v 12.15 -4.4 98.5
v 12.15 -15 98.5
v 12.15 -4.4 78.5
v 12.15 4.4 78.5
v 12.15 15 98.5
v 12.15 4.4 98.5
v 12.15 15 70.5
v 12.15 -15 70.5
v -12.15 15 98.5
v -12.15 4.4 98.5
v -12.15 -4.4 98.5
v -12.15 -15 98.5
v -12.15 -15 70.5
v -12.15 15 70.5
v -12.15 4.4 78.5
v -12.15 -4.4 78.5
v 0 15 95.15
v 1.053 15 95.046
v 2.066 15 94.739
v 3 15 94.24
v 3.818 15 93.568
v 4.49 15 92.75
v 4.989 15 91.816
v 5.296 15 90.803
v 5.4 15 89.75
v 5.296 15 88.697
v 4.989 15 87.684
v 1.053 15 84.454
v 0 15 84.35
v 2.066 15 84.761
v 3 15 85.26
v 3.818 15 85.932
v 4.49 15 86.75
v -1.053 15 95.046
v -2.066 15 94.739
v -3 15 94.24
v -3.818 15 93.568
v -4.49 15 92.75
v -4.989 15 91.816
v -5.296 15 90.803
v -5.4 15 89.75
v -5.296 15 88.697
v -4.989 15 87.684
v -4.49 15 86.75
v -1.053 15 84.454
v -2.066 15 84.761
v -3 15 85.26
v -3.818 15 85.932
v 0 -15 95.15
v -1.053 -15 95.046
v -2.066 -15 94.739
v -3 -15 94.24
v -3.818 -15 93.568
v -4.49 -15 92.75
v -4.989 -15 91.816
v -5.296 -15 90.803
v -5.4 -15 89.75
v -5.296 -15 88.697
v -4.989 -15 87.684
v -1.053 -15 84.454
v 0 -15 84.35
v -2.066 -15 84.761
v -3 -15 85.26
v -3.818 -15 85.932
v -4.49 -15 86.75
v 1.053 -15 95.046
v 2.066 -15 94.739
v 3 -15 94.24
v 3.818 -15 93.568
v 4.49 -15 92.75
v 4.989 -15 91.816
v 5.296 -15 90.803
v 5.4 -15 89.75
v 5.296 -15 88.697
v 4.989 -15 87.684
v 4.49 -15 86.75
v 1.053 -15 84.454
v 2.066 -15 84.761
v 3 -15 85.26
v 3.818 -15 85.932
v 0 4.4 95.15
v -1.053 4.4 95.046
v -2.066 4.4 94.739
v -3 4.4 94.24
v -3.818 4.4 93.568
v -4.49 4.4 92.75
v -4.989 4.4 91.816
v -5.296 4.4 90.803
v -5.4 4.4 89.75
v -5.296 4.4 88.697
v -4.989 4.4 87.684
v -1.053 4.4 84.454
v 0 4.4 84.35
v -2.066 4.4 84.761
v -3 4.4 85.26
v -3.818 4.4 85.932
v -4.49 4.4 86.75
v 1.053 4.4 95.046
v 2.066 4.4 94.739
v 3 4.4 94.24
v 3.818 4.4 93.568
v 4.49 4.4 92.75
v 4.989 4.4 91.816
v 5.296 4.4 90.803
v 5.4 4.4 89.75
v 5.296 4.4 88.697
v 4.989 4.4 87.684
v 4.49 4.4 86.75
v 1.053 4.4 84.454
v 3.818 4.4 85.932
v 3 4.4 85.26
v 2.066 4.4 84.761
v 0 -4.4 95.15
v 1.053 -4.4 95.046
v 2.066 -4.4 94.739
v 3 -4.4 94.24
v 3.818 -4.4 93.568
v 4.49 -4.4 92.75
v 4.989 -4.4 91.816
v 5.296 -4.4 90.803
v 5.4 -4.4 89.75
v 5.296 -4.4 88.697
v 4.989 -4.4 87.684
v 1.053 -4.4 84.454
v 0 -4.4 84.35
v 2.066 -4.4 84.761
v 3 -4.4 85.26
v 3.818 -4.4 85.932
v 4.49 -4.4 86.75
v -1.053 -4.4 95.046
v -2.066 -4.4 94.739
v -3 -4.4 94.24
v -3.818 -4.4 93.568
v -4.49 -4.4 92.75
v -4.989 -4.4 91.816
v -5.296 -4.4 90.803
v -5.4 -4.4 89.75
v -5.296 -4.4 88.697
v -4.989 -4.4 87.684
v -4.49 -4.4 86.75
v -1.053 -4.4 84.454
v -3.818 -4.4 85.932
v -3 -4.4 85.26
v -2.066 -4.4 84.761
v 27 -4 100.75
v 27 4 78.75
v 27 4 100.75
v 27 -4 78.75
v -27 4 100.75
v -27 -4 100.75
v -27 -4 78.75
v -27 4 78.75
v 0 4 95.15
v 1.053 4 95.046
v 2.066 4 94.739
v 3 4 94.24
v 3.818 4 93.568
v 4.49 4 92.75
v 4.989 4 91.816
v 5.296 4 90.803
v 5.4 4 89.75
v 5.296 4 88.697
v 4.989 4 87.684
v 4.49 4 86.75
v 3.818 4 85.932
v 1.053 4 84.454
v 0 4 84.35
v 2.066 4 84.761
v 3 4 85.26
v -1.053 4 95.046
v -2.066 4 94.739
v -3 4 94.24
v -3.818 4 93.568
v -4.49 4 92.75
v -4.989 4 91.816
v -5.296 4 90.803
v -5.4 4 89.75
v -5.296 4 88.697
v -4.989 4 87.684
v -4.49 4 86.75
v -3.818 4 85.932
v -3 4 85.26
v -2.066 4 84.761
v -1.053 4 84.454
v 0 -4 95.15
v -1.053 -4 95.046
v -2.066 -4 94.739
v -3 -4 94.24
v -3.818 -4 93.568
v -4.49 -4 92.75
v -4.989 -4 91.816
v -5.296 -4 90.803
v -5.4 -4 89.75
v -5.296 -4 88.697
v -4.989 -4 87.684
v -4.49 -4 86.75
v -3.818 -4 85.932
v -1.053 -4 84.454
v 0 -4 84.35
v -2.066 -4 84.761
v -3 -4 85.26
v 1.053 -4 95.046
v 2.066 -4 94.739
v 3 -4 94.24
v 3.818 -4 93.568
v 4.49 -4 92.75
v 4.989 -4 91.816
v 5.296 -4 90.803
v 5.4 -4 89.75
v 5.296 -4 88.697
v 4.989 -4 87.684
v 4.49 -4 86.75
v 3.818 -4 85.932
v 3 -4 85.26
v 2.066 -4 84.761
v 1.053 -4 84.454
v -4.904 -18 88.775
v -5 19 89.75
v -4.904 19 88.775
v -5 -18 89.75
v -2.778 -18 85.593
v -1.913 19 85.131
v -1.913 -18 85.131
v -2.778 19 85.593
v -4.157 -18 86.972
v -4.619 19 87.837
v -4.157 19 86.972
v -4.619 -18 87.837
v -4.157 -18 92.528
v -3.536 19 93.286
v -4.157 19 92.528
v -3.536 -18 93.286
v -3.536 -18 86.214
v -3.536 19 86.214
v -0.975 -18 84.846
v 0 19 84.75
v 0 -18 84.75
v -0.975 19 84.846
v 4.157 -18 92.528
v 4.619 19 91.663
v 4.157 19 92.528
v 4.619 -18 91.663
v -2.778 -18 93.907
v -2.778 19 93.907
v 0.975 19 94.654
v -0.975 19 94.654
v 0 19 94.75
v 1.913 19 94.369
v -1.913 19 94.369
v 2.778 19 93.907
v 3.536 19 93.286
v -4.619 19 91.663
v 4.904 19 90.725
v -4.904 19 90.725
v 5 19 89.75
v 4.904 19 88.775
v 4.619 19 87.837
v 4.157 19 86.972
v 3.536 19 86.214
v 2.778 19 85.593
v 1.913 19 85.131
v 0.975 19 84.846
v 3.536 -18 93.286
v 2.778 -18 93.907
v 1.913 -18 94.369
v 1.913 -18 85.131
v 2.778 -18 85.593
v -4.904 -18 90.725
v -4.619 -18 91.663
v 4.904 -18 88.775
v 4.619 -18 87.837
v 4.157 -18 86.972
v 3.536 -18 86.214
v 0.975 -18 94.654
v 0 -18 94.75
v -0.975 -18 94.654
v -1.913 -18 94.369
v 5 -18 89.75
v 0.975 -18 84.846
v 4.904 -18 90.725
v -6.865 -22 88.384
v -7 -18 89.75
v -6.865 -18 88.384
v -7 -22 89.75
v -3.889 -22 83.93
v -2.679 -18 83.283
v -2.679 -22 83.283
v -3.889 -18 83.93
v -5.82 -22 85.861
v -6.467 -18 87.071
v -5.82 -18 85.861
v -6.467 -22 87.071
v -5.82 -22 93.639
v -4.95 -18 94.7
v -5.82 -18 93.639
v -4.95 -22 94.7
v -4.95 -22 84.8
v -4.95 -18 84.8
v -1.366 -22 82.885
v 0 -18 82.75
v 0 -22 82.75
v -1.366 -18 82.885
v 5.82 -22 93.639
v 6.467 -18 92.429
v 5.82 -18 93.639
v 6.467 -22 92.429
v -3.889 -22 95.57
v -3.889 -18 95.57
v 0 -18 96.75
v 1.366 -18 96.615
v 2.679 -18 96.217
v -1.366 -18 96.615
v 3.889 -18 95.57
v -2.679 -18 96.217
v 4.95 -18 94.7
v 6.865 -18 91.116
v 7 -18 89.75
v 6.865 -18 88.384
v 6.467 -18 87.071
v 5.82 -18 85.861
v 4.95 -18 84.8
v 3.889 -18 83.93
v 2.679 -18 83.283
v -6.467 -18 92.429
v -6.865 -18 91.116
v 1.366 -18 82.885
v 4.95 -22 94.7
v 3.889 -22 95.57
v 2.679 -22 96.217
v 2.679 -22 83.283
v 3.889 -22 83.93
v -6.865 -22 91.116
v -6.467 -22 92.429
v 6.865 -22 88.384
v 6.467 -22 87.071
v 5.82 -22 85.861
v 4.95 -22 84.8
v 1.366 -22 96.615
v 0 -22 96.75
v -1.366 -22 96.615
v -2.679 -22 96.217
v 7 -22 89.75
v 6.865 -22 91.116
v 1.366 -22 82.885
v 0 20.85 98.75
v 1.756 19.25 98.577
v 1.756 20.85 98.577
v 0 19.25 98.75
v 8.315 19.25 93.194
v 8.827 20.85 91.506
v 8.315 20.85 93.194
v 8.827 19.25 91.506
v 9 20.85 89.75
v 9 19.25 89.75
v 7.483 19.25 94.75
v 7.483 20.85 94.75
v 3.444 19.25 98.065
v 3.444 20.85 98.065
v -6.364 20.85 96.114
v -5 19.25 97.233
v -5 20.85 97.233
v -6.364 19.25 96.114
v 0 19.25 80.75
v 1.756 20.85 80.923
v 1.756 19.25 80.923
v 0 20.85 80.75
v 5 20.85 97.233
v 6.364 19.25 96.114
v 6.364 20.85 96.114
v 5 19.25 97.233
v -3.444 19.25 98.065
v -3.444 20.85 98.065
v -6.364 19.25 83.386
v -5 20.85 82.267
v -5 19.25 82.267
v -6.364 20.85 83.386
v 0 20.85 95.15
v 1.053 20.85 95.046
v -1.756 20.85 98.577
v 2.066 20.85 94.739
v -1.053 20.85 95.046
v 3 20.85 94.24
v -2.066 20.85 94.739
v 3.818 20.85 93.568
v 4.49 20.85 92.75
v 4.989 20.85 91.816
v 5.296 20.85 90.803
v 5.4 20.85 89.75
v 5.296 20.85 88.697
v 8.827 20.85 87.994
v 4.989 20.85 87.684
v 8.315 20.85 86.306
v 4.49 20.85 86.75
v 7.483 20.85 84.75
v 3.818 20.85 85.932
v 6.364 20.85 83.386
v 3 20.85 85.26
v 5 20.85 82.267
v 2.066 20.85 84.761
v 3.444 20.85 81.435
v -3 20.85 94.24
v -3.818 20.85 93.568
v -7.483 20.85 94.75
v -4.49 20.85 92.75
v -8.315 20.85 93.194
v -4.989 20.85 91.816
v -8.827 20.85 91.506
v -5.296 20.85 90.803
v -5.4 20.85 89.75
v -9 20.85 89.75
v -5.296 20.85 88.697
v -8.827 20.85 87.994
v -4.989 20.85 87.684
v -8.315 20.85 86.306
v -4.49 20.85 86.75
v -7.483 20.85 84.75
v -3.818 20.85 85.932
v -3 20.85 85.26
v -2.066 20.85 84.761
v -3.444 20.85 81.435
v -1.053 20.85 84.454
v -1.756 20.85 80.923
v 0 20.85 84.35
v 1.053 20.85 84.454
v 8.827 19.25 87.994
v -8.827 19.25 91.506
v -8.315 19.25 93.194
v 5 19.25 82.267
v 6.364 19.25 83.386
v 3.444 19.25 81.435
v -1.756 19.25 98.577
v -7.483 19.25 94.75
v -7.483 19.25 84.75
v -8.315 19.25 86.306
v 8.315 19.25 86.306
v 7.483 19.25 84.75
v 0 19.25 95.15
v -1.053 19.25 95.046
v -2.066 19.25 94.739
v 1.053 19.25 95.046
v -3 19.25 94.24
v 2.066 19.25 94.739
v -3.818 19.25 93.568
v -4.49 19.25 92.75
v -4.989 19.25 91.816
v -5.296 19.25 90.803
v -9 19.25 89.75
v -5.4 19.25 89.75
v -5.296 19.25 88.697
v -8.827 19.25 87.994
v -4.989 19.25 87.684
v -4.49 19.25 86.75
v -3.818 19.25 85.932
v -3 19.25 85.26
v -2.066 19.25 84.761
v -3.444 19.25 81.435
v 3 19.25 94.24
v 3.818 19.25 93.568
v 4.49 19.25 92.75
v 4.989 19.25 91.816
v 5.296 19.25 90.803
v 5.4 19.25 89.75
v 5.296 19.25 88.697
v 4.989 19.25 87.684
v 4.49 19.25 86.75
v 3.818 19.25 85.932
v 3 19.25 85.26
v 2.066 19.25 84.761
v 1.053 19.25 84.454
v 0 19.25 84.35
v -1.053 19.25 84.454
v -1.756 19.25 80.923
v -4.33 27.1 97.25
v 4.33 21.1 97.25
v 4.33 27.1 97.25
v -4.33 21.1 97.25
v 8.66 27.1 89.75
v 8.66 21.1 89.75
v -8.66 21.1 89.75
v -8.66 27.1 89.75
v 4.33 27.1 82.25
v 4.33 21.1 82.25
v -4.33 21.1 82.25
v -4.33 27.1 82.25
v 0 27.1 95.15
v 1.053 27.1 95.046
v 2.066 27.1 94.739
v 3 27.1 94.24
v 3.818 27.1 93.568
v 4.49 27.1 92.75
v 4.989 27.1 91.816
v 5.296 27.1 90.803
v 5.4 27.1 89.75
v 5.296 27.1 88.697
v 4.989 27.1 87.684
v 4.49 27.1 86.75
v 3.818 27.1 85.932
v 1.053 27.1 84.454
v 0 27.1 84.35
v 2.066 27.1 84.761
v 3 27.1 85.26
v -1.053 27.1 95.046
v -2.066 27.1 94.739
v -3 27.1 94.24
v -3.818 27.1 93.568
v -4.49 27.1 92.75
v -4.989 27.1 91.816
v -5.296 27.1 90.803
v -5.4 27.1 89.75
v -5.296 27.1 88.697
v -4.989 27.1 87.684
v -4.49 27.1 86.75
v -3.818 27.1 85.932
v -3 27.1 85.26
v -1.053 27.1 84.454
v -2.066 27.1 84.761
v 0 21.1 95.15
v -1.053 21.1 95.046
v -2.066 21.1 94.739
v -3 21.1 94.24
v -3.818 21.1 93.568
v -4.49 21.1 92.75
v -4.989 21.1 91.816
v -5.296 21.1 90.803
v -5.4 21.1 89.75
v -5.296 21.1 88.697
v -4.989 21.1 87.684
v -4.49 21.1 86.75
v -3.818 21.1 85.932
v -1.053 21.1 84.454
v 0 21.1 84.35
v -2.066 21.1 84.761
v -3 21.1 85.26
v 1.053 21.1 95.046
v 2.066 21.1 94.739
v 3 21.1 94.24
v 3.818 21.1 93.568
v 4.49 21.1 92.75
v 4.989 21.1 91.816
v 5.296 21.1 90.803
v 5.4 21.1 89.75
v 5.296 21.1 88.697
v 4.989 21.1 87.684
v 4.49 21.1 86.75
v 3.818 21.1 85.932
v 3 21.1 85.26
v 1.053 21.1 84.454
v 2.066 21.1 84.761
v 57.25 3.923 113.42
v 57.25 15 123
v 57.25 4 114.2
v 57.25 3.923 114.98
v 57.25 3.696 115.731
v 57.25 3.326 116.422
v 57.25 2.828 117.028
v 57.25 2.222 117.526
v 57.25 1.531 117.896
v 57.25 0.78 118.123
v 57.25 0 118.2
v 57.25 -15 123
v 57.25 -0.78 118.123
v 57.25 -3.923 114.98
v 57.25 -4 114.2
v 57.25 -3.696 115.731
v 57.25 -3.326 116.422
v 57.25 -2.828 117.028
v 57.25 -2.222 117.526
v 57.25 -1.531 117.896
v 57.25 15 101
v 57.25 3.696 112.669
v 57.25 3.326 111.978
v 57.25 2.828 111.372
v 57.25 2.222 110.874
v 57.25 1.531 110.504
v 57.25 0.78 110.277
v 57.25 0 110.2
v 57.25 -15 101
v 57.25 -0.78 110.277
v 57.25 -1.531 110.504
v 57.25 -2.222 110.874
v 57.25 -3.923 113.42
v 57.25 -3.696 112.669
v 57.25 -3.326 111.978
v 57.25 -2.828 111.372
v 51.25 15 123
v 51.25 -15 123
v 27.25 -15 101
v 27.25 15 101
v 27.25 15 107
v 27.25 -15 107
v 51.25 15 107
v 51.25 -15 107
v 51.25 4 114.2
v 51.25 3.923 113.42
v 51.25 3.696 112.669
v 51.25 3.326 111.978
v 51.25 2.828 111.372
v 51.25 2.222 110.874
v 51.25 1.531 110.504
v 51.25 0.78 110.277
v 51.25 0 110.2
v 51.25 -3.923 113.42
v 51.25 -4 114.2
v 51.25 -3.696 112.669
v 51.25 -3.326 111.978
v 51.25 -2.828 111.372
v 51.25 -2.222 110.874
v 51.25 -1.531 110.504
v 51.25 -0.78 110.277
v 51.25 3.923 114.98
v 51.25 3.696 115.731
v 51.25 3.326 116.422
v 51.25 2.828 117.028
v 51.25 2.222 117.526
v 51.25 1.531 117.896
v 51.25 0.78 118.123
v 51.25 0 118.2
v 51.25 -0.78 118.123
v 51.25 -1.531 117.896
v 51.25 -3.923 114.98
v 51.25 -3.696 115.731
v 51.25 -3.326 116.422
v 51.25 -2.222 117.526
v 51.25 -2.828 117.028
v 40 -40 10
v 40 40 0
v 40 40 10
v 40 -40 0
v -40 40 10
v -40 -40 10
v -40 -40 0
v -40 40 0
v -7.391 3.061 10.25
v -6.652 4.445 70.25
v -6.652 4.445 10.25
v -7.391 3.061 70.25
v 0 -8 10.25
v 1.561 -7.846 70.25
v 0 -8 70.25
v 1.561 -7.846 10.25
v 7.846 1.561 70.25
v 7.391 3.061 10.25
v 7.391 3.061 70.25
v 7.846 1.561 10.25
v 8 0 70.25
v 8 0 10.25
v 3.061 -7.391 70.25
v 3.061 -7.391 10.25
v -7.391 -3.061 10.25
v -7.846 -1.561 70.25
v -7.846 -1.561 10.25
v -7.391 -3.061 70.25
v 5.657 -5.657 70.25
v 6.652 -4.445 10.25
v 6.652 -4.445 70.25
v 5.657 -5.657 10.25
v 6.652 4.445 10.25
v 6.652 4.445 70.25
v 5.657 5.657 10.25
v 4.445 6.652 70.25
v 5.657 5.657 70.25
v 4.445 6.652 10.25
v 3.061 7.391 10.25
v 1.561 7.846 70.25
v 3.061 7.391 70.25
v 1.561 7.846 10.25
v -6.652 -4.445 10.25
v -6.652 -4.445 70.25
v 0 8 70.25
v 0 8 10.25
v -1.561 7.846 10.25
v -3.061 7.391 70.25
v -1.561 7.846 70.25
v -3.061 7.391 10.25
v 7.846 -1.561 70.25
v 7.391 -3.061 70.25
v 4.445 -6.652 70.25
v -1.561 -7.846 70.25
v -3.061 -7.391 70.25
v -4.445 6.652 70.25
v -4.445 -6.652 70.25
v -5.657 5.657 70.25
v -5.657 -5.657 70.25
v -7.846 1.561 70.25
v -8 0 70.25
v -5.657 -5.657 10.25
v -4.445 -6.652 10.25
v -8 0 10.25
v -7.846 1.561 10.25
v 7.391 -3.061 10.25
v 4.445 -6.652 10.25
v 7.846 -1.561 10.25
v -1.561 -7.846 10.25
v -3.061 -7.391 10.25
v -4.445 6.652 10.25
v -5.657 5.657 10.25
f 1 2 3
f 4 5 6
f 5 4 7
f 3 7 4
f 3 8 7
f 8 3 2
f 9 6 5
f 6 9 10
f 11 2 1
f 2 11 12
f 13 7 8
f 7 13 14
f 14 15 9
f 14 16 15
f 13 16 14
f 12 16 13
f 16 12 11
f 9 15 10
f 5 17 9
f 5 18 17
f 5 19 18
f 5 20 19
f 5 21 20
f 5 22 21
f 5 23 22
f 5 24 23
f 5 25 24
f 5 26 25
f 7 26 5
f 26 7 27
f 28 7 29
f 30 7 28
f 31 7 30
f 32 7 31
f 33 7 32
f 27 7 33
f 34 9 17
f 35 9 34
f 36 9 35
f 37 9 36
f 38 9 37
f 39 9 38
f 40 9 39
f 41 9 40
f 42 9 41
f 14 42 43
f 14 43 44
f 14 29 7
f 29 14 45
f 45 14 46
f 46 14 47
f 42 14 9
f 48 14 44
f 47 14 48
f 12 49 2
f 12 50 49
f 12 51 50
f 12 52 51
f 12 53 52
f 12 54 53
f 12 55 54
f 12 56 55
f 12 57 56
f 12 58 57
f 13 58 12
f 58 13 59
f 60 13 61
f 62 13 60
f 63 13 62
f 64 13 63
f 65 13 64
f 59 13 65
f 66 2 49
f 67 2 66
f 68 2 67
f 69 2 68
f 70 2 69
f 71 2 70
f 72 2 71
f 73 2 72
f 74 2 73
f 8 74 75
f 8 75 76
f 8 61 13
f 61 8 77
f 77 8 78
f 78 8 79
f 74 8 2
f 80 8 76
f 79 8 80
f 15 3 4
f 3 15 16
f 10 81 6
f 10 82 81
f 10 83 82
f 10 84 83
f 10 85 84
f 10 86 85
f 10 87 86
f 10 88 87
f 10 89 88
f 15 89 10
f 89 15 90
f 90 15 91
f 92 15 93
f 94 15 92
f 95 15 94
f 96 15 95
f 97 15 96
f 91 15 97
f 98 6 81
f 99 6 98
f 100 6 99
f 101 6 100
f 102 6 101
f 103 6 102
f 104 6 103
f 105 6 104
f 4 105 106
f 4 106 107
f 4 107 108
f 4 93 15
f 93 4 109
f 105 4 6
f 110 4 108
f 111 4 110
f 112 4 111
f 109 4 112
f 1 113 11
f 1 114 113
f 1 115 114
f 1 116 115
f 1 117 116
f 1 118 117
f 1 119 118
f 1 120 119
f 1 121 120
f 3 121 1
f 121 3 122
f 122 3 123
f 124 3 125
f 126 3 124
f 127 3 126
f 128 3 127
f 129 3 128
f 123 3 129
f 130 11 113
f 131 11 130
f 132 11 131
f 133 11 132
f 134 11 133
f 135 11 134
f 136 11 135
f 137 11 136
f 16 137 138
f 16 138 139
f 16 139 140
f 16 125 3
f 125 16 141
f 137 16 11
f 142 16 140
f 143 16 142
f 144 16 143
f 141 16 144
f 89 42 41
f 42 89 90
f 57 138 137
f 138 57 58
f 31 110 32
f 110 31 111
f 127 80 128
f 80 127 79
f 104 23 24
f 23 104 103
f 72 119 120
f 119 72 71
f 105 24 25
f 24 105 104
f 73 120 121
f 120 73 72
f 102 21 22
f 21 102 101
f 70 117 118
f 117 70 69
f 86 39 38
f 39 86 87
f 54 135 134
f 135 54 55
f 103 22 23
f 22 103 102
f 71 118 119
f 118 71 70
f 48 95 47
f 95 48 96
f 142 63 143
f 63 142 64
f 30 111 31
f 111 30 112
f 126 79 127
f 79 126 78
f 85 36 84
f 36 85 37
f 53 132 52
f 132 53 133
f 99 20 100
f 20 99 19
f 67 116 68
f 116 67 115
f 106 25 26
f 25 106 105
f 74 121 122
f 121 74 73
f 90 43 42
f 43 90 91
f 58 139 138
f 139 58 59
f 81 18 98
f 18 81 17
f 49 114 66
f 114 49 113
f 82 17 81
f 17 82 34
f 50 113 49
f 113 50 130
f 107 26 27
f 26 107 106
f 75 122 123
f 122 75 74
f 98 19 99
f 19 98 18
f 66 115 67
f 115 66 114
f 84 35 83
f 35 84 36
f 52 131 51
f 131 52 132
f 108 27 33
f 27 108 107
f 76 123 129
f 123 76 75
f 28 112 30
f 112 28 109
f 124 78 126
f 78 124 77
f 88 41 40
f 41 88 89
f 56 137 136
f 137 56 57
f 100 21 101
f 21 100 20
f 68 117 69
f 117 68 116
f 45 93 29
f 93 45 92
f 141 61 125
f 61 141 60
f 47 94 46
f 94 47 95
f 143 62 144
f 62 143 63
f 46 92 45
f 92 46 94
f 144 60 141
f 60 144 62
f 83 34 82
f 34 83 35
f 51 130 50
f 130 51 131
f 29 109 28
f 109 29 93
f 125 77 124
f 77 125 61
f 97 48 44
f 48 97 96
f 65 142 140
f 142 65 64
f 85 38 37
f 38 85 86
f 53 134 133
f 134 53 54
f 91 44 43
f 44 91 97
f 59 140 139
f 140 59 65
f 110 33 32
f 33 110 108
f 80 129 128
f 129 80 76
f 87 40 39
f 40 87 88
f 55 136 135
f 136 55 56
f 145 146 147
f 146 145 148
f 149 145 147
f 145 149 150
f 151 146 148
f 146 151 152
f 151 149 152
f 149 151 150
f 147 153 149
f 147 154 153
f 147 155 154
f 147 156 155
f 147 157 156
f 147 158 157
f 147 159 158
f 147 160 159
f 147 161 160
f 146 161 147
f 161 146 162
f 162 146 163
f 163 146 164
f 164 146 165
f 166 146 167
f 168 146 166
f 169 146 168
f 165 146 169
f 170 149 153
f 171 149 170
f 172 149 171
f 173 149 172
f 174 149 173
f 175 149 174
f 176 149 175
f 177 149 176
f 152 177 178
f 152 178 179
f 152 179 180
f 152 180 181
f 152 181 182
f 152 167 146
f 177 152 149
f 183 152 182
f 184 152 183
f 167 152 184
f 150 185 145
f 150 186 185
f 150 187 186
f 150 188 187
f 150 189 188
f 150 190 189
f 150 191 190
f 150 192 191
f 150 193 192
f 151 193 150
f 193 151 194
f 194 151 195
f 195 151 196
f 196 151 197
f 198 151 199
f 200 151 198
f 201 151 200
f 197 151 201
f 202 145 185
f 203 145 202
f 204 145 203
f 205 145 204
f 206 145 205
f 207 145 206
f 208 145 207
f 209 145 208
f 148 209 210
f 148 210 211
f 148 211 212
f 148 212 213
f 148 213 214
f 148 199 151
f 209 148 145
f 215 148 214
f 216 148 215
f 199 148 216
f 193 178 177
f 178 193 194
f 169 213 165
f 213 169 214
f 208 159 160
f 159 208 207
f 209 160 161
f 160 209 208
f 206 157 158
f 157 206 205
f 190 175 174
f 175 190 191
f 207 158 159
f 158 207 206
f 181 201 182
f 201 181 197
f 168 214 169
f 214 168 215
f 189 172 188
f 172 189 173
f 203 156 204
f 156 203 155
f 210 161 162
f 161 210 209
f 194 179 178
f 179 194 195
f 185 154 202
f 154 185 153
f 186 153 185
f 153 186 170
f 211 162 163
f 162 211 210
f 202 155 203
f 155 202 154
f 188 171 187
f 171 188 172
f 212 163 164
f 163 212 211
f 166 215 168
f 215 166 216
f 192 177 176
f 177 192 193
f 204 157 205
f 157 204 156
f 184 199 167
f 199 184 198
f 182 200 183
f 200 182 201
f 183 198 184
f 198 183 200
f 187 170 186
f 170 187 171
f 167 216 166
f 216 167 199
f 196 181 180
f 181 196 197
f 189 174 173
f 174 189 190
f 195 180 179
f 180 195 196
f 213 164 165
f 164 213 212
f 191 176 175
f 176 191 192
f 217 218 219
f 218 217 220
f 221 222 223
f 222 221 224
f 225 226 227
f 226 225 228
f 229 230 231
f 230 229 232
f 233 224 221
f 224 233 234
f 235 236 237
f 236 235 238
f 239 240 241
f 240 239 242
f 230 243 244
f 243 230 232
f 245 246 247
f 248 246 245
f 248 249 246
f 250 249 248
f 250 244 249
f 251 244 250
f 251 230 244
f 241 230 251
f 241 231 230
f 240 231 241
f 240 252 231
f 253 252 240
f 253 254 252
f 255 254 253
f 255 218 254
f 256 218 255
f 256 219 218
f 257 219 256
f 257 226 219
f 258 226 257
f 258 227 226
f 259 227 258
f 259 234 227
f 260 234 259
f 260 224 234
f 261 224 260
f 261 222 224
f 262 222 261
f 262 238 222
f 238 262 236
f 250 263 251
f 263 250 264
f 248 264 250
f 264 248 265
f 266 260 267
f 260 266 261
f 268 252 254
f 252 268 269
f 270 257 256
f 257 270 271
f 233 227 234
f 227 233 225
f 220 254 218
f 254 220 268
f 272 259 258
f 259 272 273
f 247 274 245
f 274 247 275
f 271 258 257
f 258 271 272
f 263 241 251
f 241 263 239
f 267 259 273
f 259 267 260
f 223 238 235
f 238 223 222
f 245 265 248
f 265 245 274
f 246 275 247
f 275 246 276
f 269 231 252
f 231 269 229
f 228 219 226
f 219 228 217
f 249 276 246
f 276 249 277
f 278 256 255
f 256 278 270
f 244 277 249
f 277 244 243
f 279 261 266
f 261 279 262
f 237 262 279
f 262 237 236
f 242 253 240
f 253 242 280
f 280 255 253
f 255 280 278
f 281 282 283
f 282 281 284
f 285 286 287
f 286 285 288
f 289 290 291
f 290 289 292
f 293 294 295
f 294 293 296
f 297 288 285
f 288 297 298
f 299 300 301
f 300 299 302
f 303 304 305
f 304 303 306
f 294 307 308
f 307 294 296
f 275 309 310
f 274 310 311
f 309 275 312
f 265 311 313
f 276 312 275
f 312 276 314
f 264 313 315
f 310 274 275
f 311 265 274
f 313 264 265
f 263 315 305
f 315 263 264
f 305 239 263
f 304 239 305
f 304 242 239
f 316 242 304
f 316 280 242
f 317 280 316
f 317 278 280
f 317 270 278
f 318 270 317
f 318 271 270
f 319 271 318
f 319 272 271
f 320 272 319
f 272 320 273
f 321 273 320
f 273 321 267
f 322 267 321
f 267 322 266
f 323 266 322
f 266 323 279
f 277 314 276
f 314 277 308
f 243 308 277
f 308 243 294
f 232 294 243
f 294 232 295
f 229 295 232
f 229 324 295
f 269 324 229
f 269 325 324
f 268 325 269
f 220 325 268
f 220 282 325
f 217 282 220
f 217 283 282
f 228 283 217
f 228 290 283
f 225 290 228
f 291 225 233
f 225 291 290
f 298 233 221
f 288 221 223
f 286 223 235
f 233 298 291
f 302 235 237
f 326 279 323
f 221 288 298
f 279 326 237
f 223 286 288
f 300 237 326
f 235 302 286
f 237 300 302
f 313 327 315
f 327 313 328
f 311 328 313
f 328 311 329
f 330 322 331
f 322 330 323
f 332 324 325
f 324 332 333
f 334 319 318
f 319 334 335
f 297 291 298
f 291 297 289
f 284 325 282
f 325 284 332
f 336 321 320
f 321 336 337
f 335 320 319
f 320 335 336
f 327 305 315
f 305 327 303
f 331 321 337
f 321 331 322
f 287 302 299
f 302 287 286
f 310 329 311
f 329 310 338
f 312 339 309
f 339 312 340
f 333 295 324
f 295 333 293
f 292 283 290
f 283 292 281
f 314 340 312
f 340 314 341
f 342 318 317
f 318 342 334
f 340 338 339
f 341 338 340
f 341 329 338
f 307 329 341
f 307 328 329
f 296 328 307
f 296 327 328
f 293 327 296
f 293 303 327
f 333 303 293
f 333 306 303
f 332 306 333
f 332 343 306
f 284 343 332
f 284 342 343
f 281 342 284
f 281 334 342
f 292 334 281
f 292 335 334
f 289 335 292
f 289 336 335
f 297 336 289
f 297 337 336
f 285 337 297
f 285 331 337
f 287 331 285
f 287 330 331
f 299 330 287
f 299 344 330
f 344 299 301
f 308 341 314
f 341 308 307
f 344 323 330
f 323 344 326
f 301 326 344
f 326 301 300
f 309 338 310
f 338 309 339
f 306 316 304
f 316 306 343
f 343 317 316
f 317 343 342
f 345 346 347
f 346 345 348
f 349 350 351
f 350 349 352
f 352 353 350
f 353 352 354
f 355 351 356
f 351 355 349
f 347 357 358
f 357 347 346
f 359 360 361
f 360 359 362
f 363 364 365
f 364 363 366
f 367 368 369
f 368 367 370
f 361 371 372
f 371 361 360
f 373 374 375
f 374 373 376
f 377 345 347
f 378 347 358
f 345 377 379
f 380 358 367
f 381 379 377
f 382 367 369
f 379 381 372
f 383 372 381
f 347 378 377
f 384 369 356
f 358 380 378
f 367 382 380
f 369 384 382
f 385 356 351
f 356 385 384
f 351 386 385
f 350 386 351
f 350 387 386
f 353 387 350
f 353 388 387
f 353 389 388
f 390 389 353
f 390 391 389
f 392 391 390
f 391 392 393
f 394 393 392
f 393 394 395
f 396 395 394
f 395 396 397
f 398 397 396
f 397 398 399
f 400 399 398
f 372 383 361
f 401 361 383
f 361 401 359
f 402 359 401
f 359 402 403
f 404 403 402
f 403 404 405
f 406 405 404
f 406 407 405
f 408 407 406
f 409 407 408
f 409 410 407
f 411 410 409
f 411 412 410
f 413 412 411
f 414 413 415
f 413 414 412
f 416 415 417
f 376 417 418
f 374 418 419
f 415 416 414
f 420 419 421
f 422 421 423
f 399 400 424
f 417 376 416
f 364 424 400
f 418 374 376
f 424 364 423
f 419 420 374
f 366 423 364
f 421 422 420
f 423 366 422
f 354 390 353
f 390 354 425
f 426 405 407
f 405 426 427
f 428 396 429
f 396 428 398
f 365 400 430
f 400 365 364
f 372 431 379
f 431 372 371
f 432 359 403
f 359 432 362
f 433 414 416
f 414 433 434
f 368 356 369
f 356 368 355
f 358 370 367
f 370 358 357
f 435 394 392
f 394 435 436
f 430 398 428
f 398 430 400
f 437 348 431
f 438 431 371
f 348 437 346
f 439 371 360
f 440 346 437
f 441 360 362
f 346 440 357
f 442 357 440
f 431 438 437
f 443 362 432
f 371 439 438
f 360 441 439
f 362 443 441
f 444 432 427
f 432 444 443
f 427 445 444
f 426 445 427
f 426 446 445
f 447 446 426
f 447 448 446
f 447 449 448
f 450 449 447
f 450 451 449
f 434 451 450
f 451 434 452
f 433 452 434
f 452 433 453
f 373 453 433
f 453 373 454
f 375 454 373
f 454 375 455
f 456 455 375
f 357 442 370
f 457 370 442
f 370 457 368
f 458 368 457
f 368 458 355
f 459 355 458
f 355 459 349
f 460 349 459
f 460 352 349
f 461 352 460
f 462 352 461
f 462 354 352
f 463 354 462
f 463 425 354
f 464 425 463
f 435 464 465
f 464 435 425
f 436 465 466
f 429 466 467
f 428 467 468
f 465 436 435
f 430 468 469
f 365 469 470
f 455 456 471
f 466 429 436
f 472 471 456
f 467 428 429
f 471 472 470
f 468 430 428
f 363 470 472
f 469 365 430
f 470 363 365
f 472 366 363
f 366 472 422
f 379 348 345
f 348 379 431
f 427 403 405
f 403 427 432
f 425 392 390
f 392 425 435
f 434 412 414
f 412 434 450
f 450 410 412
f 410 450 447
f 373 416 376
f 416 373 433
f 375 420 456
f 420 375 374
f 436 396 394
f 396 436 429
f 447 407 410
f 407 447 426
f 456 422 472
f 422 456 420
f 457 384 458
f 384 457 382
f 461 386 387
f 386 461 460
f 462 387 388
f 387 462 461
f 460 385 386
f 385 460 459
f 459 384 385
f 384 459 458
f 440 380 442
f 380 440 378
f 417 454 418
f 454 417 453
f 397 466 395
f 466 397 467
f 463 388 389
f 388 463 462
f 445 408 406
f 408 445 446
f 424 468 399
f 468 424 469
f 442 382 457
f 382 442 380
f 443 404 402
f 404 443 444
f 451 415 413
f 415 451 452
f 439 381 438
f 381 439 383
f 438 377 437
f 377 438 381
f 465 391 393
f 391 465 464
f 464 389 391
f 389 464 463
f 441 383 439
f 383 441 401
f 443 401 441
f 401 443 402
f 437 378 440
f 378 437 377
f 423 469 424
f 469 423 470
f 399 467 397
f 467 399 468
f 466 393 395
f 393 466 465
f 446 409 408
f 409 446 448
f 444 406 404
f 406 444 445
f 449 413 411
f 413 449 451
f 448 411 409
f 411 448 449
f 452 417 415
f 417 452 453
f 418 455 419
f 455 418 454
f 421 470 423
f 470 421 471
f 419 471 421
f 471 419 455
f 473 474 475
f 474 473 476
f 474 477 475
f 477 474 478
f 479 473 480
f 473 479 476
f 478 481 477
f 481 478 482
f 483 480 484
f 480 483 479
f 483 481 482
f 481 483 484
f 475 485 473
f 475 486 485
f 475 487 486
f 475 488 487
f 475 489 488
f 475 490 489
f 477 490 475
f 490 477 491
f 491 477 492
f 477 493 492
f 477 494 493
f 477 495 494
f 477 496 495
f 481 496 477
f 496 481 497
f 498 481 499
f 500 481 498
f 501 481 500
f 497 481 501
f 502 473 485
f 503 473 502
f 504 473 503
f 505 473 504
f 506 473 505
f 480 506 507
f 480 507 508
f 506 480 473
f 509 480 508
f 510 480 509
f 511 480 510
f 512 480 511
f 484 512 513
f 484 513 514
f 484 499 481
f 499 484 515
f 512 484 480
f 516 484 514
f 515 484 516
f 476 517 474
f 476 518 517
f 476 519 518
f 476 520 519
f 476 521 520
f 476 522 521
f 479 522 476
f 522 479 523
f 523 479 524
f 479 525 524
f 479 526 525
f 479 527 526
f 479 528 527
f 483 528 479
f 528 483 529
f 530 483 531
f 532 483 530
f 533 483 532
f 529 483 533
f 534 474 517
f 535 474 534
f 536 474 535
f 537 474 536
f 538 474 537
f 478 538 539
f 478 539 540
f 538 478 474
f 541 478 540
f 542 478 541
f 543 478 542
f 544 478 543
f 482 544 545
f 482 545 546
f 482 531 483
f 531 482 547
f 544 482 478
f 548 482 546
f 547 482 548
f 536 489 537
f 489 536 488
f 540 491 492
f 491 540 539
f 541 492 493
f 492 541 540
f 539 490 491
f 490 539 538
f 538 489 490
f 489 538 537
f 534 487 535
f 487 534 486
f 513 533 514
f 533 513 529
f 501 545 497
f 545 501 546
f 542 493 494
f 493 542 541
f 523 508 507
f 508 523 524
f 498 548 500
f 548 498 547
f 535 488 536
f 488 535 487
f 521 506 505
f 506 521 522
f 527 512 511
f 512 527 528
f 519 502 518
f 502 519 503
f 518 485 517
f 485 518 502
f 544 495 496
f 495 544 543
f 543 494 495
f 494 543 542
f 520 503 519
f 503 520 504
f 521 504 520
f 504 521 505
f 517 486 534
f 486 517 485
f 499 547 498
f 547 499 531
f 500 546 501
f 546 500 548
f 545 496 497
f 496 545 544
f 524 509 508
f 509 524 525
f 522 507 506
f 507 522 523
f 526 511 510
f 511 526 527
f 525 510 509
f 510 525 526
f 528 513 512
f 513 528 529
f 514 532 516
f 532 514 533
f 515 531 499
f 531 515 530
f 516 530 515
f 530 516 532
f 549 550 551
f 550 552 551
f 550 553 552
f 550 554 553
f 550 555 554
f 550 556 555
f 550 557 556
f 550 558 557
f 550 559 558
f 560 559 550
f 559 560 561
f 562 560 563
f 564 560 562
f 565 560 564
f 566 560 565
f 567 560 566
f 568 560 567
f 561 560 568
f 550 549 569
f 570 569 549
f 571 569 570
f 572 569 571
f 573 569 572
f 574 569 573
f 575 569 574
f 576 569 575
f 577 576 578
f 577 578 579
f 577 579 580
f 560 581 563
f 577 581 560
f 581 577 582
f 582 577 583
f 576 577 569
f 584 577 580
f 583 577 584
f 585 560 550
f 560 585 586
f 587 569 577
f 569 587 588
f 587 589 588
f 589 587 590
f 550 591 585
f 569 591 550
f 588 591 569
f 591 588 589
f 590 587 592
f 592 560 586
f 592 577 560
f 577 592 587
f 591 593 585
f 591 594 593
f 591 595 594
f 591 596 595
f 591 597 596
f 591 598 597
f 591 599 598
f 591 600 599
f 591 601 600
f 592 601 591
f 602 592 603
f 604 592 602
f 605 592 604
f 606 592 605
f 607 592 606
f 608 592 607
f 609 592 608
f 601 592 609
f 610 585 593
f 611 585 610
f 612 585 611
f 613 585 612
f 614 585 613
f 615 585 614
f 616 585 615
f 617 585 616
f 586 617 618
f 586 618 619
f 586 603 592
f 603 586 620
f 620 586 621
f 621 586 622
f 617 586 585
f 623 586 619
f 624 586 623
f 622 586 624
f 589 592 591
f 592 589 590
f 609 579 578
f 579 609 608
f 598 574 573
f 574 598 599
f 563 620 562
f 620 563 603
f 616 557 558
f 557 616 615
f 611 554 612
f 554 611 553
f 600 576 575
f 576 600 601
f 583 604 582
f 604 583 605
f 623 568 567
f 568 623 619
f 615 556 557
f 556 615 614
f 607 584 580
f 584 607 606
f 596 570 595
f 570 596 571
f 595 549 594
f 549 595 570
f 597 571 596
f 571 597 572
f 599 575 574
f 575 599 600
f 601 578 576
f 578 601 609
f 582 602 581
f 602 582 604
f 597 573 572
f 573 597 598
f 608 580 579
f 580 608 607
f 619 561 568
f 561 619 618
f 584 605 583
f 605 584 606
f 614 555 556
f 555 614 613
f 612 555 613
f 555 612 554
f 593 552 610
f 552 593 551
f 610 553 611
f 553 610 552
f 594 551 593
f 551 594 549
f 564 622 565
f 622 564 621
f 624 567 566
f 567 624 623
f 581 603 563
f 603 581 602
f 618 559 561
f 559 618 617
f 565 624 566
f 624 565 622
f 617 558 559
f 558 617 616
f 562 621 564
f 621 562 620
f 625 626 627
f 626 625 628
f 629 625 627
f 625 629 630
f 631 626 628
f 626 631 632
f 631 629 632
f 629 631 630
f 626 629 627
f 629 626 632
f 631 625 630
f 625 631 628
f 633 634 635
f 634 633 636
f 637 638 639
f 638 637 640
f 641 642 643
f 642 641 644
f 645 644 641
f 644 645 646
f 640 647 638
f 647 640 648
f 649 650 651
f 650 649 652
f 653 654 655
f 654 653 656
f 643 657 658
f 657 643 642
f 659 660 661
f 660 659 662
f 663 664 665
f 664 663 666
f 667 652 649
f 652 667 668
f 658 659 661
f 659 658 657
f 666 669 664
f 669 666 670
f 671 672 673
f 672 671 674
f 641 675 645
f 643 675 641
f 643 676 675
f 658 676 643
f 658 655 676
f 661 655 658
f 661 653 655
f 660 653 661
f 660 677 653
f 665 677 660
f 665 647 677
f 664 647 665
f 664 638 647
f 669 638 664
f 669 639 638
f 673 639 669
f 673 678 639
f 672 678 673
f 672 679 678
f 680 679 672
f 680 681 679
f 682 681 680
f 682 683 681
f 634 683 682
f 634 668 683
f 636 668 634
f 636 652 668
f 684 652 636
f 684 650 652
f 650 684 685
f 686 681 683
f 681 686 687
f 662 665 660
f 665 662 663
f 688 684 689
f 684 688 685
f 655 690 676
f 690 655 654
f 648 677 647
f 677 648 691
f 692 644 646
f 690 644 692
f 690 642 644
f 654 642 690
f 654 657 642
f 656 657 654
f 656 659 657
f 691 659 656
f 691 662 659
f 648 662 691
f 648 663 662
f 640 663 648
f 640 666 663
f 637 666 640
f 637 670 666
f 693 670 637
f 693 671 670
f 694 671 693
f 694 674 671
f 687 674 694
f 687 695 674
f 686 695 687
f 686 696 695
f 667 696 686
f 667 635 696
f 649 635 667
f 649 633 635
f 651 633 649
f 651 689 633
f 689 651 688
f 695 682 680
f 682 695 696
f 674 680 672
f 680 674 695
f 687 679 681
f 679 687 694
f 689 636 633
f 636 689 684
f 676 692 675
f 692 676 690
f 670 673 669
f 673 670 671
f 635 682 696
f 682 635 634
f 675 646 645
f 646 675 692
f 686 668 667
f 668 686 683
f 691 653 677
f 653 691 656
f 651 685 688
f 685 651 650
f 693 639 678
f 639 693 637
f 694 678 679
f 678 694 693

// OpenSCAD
$fn = 32;

// ------------------------------------------------------------------------
// Lamp arm: column d16 x 60 mm, arm 54 mm
// Every part is its own module, assembly() places every instance.
// ------------------------------------------------------------------------

// --- part 1 ---
module lamp_base() {
  difference() {
    translate([-40, -40, 0]) cube([80, 80, 10]);
  }
}

// --- part 2 ---
module lamp_column() {
  cylinder(h = 60, d = 16);
}

// --- part 3 ---
module head_fork() {
  difference() {
    translate([-12.15, -15, 0]) cube([24.3, 30, 28]);
    translate([-13.15, -4.4, 8]) cube([26.3, 8.8, 21]);
    translate([0, 0, 19.25]) rotate([90, 0, 0]) cylinder(h = 32, d = 10.8, center = true);
  }
}

// --- part 4 ---
module lamp_arm() {
  difference() {
    translate([-27, -4, 0]) cube([54, 8, 22]);
    translate([0, 0, 11]) rotate([90, 0, 0]) cylinder(h = 10, d = 10.8, center = true);
  }
}

// --- part 5 ---
module arm_pin() {
  rotate([0, 90, 0]) cylinder(h = 38, d = 10, center = true);
  translate([-22, 0, 0]) rotate([0, 90, 0]) cylinder(h = 4, d = 14);
}

// --- part 6 ---
module arm_washer() {
  difference() {
      translate([0, 0, 0]) cylinder(h = 1.6, d = 18);
      translate([0, 0, -1]) cylinder(h = 3.6, d = 10.8);
    }
}

// --- part 7 ---
module arm_nut() {
  difference() {
    linear_extrude(height = 6) polygon(points = [[8.66, 0], [4.33, 7.5], [-4.33, 7.5], [-8.66, 0], [-4.33, -7.5], [4.33, -7.5]]);
    translate([0, 0, -1]) cylinder(h = 8, d = 10.8);
  }
}

// --- part 8 ---
module shade_bracket() {
  difference() {
    translate([-15, -15, 0]) cube([30, 30, 22]);
    translate([-16, -16, 6]) cube([25, 32, 17]);
    translate([12, 0, 13.2]) rotate([0, 90, 0]) cylinder(h = 8, d = 8, center = true);
  }
}

// --- assembly ---
module assembly() {
  color([0.80, 0.24, 0.20]) translate([0, 0, 0]) rotate([0, 0, 0]) lamp_base();
  color([0.20, 0.45, 0.75]) translate([0, 0, 10.25]) rotate([0, 0, 0]) lamp_column();
  color([0.25, 0.62, 0.32]) translate([0, 0, 70.5]) rotate([0, 0, 0]) head_fork();
  color([0.92, 0.70, 0.18]) translate([0, 0, 78.75]) rotate([0, 0, 0]) lamp_arm();
  color([0.58, 0.35, 0.70]) translate([0, 0, 89.75]) rotate([0, 0, 90]) arm_pin();
  color([0.16, 0.66, 0.66]) translate([0, 20.85, 89.75]) rotate([90, 0, 0]) arm_washer();
  color([0.85, 0.48, 0.18]) translate([0, 27.1, 89.75]) rotate([90, 0, 0]) arm_nut();
  color([0.55, 0.60, 0.65]) translate([42.25, 0, 101]) rotate([0, 0, 0]) shade_bracket();
}

assembly();
